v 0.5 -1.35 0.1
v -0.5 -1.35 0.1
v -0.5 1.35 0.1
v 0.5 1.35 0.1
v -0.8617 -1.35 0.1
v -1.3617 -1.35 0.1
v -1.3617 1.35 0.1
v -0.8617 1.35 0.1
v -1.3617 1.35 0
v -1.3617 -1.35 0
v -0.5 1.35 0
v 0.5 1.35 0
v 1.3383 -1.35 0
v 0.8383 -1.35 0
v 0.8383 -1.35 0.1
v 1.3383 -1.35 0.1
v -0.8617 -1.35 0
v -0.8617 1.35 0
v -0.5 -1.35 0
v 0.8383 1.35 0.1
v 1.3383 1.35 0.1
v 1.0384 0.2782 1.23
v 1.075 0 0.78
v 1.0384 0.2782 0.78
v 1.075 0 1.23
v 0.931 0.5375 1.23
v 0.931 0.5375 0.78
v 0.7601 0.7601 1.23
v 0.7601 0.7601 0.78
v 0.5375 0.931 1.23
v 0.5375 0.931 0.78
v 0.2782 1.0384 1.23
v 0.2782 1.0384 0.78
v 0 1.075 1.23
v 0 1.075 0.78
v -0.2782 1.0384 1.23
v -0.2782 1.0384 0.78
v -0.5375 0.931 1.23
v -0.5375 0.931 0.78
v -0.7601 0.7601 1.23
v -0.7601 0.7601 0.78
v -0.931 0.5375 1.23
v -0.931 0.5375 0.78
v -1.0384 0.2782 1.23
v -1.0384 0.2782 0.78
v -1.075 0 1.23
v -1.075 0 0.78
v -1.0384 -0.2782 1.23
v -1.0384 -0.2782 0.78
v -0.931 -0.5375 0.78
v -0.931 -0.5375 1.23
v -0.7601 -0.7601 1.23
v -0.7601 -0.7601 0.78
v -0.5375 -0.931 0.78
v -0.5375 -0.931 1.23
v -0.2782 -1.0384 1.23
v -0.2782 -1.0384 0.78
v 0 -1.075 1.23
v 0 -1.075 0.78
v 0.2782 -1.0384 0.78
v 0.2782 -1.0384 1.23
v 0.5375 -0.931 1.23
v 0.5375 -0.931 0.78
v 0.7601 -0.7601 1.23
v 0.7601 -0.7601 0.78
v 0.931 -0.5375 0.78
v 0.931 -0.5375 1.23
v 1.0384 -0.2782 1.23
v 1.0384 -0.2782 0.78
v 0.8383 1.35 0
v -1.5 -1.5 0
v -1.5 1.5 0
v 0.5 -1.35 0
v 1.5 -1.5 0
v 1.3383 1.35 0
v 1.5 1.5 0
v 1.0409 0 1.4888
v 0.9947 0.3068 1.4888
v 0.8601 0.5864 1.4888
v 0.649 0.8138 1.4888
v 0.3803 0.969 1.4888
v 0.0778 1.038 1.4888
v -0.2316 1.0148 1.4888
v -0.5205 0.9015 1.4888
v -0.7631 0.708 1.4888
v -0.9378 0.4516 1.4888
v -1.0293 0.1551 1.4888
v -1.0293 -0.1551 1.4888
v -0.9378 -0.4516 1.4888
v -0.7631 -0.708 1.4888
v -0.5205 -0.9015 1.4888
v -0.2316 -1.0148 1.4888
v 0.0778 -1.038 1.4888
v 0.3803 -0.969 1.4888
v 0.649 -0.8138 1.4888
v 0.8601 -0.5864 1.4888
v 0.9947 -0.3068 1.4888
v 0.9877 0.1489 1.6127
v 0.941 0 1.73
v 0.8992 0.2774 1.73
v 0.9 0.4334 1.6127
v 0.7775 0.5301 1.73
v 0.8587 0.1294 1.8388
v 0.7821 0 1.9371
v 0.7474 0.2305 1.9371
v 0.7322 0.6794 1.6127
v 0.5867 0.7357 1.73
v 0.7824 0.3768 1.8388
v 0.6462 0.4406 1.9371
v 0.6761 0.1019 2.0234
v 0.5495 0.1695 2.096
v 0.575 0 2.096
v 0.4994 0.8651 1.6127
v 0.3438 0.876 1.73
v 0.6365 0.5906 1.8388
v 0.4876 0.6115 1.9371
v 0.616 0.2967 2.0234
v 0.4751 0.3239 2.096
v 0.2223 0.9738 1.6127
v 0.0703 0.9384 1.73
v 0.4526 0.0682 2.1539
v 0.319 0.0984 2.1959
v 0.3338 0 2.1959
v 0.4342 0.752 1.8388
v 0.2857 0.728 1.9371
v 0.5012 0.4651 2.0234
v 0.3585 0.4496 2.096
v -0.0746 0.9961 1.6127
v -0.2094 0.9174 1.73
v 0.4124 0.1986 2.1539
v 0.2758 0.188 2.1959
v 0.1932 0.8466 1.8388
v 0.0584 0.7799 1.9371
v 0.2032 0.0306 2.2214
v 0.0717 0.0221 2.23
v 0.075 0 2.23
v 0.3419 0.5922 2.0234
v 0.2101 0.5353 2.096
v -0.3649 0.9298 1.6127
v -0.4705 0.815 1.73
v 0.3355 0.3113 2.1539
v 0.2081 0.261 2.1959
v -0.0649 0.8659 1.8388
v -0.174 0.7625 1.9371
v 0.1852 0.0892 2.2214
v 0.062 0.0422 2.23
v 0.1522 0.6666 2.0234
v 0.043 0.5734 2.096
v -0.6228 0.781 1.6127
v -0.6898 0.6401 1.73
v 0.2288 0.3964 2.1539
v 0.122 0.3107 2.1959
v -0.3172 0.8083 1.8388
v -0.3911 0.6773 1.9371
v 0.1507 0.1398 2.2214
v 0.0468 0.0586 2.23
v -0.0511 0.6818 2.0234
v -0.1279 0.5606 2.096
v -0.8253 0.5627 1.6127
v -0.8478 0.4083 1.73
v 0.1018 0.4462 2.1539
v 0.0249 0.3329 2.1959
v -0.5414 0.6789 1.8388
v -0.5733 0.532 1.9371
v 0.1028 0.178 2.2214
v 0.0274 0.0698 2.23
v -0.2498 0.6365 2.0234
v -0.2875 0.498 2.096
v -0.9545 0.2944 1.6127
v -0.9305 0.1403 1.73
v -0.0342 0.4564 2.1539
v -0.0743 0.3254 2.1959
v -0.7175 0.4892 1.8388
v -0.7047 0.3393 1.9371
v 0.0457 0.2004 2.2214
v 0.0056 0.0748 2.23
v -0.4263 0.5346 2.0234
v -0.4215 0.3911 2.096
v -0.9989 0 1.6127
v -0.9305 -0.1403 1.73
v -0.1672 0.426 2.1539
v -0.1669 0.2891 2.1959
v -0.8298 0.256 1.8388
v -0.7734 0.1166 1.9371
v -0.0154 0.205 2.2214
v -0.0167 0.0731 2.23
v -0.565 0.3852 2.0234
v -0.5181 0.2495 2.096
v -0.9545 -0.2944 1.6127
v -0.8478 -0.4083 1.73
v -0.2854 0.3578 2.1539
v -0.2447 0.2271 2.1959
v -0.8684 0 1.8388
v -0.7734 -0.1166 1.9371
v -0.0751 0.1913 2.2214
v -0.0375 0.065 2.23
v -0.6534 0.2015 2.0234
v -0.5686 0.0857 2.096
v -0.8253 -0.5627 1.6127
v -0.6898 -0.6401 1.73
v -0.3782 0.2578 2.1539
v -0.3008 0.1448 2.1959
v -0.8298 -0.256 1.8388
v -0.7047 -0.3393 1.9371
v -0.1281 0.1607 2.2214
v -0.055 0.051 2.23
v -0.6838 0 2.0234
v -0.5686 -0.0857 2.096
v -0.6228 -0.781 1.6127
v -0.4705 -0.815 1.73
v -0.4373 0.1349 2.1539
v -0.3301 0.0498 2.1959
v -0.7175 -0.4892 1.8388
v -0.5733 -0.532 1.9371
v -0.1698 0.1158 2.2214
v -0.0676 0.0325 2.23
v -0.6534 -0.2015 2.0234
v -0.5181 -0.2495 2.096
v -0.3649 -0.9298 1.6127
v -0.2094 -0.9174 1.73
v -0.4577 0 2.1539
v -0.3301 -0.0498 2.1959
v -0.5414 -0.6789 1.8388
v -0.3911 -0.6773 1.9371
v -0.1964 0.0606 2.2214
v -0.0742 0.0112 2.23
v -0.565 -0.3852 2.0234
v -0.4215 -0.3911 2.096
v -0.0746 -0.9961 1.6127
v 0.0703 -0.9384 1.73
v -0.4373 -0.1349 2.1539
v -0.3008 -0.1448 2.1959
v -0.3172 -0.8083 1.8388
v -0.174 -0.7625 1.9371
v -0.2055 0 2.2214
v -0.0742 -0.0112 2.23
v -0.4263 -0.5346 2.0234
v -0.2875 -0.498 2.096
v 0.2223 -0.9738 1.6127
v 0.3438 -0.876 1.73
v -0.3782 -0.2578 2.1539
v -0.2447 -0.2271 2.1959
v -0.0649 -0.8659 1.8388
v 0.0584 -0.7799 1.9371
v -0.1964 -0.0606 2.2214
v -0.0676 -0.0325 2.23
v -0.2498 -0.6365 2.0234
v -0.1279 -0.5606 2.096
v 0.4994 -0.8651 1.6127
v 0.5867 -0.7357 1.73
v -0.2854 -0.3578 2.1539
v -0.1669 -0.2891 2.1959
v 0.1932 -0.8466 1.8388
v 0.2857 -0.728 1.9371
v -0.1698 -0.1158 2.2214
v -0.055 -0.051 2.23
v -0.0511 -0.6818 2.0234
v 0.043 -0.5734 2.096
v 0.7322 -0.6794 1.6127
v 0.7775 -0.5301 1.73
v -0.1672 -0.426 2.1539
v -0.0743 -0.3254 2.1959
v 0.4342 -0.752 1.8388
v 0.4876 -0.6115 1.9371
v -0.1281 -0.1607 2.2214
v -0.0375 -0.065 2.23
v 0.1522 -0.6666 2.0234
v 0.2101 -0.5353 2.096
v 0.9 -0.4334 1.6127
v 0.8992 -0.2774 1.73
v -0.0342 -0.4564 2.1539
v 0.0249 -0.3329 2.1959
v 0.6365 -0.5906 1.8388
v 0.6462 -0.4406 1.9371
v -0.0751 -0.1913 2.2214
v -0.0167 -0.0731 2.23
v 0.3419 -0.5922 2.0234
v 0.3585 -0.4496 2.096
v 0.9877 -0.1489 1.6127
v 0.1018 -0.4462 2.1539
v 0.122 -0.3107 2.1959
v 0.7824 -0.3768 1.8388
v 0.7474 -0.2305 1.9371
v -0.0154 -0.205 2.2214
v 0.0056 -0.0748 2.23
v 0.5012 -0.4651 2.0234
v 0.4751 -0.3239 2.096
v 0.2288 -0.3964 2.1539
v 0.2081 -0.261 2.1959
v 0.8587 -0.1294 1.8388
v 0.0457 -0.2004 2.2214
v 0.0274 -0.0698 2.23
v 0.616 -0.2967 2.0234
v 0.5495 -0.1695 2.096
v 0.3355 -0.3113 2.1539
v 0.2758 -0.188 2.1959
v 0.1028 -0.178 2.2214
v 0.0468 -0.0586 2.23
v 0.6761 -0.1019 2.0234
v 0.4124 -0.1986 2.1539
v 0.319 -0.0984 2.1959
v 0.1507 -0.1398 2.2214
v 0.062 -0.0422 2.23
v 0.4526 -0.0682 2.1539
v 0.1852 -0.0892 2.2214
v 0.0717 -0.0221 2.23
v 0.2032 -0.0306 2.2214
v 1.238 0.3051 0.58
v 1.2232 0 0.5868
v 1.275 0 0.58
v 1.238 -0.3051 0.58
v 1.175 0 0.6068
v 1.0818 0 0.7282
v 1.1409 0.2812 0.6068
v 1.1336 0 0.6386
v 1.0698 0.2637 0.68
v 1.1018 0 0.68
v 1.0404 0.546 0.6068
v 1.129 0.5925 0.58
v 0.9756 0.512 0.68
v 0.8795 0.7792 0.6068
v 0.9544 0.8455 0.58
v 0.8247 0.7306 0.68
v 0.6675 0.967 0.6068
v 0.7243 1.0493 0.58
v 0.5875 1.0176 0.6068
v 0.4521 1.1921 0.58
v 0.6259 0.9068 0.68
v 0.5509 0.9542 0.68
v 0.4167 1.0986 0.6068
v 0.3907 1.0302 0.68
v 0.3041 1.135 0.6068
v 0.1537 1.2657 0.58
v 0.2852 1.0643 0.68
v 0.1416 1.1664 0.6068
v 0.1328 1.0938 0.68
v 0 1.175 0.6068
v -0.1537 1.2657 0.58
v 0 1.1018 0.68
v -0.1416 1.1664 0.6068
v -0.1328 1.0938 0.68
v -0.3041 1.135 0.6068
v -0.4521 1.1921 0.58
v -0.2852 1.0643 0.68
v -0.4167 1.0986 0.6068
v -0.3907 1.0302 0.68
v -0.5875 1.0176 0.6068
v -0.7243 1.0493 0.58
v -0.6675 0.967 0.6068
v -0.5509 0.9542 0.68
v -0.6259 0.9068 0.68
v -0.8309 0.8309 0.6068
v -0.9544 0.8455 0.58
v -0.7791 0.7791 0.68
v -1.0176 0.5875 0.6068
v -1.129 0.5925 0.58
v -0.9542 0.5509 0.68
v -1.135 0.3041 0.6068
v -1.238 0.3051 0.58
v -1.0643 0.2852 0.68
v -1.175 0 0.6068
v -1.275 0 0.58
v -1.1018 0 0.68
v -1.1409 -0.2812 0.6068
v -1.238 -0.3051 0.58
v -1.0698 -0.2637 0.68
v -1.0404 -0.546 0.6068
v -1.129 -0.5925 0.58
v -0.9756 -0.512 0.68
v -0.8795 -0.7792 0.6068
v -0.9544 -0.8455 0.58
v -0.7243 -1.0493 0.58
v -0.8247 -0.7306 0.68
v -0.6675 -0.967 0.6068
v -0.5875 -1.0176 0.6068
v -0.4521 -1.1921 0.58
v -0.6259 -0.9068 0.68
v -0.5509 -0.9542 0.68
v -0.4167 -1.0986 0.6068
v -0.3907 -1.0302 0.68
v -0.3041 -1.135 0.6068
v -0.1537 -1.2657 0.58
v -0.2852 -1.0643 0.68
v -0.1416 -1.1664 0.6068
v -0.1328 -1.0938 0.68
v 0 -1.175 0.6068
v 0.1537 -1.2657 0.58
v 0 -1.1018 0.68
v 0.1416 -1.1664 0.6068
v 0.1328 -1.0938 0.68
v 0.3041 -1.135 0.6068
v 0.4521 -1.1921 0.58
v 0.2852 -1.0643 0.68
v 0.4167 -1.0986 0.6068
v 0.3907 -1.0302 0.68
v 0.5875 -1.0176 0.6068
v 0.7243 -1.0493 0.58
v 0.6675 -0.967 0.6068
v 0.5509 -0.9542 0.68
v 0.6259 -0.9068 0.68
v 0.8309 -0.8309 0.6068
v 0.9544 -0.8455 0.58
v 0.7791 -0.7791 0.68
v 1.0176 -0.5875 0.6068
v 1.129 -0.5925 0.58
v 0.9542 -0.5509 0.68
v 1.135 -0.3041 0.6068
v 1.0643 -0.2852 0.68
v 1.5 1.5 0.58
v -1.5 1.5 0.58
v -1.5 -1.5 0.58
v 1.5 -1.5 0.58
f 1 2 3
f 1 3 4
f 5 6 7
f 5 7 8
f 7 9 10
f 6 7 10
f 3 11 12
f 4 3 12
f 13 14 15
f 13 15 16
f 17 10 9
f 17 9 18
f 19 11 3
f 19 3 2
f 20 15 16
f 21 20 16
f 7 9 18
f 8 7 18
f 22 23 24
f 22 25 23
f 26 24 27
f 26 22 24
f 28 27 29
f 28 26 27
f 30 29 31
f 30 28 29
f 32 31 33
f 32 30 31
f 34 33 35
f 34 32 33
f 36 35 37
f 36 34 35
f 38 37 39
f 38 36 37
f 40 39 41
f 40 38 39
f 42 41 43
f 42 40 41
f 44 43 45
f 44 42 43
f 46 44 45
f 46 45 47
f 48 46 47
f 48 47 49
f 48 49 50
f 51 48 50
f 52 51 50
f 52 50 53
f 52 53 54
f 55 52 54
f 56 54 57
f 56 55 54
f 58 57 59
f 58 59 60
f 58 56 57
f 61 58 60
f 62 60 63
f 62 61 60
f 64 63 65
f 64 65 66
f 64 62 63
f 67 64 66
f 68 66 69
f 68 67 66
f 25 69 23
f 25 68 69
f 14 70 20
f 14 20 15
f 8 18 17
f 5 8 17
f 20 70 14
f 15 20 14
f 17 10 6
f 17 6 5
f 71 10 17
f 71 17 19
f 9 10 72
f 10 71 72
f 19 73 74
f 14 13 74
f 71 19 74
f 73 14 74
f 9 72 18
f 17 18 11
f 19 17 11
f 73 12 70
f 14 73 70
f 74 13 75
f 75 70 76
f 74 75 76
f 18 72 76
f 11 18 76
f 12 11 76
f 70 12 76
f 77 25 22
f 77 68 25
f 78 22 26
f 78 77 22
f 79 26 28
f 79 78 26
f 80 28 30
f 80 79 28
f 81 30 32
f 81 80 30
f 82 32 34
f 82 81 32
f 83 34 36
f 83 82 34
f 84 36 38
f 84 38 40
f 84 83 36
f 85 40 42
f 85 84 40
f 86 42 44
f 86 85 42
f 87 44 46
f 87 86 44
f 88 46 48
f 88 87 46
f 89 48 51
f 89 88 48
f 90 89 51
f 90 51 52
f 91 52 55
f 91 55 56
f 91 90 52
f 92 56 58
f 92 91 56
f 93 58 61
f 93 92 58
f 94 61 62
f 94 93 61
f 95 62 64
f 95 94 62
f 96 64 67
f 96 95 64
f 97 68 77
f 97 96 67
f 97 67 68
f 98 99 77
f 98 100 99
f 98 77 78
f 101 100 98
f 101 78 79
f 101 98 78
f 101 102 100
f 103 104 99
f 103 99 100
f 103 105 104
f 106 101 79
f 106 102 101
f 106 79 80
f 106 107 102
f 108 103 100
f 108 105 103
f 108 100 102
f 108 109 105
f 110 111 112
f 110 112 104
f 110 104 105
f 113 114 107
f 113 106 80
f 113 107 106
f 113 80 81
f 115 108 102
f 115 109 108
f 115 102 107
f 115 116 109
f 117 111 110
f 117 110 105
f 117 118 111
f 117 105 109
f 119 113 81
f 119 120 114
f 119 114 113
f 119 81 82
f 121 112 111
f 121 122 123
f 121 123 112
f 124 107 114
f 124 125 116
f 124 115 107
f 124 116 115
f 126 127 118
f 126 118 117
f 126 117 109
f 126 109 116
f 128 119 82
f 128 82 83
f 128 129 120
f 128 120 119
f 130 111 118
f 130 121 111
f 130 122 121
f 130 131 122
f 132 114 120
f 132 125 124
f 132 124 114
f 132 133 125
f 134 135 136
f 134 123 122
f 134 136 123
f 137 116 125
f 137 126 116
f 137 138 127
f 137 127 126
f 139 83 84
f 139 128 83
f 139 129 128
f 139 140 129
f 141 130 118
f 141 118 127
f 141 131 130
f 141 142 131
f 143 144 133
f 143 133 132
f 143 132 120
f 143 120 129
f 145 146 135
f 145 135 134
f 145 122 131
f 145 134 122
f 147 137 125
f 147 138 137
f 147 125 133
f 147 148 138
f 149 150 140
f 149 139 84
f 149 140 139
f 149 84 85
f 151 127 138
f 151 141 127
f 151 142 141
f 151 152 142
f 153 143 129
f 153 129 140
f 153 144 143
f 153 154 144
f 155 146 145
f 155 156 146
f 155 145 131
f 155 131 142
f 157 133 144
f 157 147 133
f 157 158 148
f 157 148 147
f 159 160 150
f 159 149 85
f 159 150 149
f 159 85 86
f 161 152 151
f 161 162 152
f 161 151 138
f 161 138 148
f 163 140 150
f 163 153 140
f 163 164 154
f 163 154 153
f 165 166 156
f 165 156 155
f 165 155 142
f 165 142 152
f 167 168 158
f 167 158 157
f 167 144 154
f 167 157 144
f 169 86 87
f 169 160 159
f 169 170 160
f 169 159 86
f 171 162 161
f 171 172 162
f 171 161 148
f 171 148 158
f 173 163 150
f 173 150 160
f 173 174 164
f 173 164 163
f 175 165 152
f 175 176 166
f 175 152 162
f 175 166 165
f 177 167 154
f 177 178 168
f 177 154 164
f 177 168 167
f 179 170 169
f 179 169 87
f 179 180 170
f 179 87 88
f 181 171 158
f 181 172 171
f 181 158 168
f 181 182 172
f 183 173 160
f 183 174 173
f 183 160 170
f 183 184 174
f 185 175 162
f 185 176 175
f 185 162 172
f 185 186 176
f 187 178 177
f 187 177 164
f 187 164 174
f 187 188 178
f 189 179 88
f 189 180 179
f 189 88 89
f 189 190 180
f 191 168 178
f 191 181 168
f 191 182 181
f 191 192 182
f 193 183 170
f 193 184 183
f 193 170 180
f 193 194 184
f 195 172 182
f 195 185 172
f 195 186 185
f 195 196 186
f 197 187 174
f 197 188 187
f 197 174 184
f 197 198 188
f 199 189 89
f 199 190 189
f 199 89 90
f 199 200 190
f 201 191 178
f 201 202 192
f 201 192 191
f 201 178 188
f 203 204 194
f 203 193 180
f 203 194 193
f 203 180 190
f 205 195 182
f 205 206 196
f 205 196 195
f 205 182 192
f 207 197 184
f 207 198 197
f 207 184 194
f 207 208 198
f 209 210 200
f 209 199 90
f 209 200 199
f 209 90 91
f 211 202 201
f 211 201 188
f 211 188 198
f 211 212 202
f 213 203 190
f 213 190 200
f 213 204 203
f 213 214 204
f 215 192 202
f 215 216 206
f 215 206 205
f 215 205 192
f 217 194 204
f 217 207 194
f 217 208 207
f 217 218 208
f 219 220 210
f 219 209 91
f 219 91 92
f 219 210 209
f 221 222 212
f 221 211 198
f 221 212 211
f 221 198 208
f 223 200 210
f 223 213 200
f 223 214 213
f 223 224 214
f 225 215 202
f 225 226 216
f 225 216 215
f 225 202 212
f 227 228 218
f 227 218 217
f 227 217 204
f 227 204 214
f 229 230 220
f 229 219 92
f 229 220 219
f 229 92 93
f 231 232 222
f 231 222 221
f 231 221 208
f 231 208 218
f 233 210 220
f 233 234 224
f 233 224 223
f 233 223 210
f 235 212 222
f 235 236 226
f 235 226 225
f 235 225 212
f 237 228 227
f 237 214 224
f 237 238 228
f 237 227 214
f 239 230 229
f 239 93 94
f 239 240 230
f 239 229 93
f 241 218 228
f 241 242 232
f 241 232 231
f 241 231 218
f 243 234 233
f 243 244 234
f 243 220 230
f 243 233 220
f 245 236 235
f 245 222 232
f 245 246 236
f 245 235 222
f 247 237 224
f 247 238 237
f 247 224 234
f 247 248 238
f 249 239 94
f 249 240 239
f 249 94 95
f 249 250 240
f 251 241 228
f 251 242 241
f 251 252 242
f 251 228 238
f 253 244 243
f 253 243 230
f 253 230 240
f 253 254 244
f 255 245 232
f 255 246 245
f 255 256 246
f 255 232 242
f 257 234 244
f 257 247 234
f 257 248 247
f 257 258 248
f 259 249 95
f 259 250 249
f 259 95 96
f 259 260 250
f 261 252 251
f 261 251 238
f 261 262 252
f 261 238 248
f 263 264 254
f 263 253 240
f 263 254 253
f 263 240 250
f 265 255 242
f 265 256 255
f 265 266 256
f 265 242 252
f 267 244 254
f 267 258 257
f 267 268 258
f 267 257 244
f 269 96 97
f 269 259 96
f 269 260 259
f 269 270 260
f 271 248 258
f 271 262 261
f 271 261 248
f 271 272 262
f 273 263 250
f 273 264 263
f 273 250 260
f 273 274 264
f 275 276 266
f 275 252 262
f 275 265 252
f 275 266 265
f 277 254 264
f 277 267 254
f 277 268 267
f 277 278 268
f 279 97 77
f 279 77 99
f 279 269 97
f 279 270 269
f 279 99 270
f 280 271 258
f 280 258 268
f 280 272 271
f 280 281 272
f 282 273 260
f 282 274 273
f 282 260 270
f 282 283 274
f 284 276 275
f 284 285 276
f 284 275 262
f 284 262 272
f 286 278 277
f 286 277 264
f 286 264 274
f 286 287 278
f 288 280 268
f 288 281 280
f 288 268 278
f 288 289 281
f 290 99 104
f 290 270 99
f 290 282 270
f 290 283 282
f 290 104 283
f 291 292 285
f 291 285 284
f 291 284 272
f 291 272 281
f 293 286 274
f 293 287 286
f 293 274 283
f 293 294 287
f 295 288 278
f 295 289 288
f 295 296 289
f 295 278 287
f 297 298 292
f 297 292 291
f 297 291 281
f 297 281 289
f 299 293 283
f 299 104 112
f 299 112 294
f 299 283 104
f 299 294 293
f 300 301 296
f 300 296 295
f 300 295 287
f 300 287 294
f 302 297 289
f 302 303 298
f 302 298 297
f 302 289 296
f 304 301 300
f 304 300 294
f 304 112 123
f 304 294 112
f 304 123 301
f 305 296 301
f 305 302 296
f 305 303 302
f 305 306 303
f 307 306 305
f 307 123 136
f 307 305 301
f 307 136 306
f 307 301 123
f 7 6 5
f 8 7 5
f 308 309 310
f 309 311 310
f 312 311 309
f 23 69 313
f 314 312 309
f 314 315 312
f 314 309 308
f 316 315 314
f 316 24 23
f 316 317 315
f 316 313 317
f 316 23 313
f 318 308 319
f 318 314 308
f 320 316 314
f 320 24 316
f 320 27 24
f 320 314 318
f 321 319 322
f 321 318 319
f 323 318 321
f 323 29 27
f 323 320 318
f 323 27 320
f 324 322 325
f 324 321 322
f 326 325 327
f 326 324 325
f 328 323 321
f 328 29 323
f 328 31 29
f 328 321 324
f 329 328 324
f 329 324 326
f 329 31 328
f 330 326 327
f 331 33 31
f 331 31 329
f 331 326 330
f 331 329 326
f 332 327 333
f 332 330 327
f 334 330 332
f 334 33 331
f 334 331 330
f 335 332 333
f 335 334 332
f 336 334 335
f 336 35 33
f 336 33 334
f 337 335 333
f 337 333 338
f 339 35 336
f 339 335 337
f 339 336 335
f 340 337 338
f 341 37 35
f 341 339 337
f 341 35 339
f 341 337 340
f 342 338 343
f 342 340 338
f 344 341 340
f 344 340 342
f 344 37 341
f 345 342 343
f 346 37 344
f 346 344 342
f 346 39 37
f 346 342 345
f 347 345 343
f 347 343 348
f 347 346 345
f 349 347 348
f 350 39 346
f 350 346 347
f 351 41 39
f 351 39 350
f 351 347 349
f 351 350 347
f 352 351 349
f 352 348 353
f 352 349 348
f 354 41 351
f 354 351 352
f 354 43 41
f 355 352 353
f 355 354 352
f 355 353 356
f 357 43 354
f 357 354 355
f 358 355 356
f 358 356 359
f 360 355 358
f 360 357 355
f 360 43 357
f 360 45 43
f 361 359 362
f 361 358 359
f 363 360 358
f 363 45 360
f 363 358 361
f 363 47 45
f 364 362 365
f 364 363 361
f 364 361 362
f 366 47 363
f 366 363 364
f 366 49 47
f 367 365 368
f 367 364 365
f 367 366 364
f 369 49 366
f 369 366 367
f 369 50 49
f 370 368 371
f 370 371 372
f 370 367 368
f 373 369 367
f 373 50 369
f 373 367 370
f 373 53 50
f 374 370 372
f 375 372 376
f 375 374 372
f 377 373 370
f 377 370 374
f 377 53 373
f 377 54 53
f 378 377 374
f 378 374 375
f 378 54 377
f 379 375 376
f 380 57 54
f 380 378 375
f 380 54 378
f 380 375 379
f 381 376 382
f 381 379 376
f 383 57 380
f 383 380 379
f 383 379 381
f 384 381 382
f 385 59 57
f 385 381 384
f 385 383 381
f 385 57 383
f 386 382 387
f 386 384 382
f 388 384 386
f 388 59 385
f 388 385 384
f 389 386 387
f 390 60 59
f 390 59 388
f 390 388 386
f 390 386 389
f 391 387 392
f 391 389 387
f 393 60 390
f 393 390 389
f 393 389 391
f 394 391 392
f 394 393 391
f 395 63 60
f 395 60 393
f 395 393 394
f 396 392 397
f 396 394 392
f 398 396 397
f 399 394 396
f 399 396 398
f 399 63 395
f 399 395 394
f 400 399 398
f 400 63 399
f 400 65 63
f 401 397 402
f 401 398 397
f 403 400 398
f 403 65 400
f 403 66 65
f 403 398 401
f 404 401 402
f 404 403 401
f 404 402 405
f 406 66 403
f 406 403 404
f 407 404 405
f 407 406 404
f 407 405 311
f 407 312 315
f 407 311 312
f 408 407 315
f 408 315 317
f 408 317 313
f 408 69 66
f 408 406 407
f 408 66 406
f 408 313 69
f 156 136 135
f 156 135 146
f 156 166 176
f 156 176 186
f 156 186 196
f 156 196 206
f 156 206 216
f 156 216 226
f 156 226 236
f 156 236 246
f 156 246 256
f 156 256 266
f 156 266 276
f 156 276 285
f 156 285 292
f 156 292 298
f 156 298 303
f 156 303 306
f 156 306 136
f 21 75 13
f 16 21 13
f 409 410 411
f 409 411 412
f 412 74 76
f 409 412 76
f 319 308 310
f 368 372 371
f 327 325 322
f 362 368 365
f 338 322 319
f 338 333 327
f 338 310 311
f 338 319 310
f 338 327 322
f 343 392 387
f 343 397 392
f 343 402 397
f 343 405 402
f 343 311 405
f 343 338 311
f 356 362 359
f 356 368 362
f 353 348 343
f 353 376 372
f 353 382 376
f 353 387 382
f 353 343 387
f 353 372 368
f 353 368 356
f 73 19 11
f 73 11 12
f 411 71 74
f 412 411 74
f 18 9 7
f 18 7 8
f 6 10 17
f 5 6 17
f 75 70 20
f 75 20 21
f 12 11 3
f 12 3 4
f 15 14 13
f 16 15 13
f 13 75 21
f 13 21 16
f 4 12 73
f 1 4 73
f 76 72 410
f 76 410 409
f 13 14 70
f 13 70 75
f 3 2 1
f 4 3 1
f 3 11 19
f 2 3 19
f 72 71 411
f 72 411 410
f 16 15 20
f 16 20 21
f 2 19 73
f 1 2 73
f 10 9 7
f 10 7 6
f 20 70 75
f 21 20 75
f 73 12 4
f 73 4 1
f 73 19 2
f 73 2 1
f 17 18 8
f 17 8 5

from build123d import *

# Parameters (mm, degrees)
F0_W     = 3
F0_H     = 3
F1_DEPTH = 0.58
F4_W     = 1
F4_H     = 2.7
F4_W_2   = 0.5
F5_DEPTH = 0.1
F6_DEPTH = 0.1


with BuildPart() as f1:
    # F0 (on Top) → F1 (new body)
    with BuildSketch(Plane.XY):
        Rectangle(F0_W, F0_H)
    extrude(amount=F1_DEPTH)

    # F4 (on face) → F5 (cut)
    with BuildSketch(Plane(origin=(0, 0, 0), x_dir=(1, 0, 0), z_dir=(0, 0, -1))):
        Rectangle(F4_W, F4_H)
        with Locations((1.088346, 0)):
            Rectangle(F4_W_2, F4_H)
        with Locations((-1.111654, 0)):
            Rectangle(F4_W_2, F4_H)
    extrude(amount=-F5_DEPTH, mode=Mode.SUBTRACT)


with BuildPart() as f3:
    # F2 (on Front) → F3 (revolve)
    with BuildSketch(Plane.XZ):
        with BuildLine():
            ThreePointArc((1.275, 0.58), (1.133579, 0.638579), (1.075, 0.78))
            Line((1.075, 0.78), (1.075, 1.23))
            ThreePointArc((1.075, 1.23), (0.782107, 1.937107), (0.075, 2.23))
            Line((0.075, 2.23), (0, 2.23))
            Line((0, 2.23), (0, 0.58))
            Line((0, 0.58), (1.275, 0.58))
        make_face()
    revolve(axis=Axis((0, 0, 1.405), (0, 0, 1)))


with BuildPart() as f6:
    # F4 (on face) → F6 (new body)
    with BuildSketch(Plane(origin=(0, 0, 0), x_dir=(1, 0, 0), z_dir=(0, 0, -1))):
        Rectangle(F4_W, F4_H)
        with Locations((1.088346, 0)):
            Rectangle(F4_W_2, F4_H)
        with Locations((-1.111654, 0)):
            Rectangle(F4_W_2, F4_H)
    extrude(amount=-F6_DEPTH)


solid = Compound([f1.part, f3.part, f6.part])
